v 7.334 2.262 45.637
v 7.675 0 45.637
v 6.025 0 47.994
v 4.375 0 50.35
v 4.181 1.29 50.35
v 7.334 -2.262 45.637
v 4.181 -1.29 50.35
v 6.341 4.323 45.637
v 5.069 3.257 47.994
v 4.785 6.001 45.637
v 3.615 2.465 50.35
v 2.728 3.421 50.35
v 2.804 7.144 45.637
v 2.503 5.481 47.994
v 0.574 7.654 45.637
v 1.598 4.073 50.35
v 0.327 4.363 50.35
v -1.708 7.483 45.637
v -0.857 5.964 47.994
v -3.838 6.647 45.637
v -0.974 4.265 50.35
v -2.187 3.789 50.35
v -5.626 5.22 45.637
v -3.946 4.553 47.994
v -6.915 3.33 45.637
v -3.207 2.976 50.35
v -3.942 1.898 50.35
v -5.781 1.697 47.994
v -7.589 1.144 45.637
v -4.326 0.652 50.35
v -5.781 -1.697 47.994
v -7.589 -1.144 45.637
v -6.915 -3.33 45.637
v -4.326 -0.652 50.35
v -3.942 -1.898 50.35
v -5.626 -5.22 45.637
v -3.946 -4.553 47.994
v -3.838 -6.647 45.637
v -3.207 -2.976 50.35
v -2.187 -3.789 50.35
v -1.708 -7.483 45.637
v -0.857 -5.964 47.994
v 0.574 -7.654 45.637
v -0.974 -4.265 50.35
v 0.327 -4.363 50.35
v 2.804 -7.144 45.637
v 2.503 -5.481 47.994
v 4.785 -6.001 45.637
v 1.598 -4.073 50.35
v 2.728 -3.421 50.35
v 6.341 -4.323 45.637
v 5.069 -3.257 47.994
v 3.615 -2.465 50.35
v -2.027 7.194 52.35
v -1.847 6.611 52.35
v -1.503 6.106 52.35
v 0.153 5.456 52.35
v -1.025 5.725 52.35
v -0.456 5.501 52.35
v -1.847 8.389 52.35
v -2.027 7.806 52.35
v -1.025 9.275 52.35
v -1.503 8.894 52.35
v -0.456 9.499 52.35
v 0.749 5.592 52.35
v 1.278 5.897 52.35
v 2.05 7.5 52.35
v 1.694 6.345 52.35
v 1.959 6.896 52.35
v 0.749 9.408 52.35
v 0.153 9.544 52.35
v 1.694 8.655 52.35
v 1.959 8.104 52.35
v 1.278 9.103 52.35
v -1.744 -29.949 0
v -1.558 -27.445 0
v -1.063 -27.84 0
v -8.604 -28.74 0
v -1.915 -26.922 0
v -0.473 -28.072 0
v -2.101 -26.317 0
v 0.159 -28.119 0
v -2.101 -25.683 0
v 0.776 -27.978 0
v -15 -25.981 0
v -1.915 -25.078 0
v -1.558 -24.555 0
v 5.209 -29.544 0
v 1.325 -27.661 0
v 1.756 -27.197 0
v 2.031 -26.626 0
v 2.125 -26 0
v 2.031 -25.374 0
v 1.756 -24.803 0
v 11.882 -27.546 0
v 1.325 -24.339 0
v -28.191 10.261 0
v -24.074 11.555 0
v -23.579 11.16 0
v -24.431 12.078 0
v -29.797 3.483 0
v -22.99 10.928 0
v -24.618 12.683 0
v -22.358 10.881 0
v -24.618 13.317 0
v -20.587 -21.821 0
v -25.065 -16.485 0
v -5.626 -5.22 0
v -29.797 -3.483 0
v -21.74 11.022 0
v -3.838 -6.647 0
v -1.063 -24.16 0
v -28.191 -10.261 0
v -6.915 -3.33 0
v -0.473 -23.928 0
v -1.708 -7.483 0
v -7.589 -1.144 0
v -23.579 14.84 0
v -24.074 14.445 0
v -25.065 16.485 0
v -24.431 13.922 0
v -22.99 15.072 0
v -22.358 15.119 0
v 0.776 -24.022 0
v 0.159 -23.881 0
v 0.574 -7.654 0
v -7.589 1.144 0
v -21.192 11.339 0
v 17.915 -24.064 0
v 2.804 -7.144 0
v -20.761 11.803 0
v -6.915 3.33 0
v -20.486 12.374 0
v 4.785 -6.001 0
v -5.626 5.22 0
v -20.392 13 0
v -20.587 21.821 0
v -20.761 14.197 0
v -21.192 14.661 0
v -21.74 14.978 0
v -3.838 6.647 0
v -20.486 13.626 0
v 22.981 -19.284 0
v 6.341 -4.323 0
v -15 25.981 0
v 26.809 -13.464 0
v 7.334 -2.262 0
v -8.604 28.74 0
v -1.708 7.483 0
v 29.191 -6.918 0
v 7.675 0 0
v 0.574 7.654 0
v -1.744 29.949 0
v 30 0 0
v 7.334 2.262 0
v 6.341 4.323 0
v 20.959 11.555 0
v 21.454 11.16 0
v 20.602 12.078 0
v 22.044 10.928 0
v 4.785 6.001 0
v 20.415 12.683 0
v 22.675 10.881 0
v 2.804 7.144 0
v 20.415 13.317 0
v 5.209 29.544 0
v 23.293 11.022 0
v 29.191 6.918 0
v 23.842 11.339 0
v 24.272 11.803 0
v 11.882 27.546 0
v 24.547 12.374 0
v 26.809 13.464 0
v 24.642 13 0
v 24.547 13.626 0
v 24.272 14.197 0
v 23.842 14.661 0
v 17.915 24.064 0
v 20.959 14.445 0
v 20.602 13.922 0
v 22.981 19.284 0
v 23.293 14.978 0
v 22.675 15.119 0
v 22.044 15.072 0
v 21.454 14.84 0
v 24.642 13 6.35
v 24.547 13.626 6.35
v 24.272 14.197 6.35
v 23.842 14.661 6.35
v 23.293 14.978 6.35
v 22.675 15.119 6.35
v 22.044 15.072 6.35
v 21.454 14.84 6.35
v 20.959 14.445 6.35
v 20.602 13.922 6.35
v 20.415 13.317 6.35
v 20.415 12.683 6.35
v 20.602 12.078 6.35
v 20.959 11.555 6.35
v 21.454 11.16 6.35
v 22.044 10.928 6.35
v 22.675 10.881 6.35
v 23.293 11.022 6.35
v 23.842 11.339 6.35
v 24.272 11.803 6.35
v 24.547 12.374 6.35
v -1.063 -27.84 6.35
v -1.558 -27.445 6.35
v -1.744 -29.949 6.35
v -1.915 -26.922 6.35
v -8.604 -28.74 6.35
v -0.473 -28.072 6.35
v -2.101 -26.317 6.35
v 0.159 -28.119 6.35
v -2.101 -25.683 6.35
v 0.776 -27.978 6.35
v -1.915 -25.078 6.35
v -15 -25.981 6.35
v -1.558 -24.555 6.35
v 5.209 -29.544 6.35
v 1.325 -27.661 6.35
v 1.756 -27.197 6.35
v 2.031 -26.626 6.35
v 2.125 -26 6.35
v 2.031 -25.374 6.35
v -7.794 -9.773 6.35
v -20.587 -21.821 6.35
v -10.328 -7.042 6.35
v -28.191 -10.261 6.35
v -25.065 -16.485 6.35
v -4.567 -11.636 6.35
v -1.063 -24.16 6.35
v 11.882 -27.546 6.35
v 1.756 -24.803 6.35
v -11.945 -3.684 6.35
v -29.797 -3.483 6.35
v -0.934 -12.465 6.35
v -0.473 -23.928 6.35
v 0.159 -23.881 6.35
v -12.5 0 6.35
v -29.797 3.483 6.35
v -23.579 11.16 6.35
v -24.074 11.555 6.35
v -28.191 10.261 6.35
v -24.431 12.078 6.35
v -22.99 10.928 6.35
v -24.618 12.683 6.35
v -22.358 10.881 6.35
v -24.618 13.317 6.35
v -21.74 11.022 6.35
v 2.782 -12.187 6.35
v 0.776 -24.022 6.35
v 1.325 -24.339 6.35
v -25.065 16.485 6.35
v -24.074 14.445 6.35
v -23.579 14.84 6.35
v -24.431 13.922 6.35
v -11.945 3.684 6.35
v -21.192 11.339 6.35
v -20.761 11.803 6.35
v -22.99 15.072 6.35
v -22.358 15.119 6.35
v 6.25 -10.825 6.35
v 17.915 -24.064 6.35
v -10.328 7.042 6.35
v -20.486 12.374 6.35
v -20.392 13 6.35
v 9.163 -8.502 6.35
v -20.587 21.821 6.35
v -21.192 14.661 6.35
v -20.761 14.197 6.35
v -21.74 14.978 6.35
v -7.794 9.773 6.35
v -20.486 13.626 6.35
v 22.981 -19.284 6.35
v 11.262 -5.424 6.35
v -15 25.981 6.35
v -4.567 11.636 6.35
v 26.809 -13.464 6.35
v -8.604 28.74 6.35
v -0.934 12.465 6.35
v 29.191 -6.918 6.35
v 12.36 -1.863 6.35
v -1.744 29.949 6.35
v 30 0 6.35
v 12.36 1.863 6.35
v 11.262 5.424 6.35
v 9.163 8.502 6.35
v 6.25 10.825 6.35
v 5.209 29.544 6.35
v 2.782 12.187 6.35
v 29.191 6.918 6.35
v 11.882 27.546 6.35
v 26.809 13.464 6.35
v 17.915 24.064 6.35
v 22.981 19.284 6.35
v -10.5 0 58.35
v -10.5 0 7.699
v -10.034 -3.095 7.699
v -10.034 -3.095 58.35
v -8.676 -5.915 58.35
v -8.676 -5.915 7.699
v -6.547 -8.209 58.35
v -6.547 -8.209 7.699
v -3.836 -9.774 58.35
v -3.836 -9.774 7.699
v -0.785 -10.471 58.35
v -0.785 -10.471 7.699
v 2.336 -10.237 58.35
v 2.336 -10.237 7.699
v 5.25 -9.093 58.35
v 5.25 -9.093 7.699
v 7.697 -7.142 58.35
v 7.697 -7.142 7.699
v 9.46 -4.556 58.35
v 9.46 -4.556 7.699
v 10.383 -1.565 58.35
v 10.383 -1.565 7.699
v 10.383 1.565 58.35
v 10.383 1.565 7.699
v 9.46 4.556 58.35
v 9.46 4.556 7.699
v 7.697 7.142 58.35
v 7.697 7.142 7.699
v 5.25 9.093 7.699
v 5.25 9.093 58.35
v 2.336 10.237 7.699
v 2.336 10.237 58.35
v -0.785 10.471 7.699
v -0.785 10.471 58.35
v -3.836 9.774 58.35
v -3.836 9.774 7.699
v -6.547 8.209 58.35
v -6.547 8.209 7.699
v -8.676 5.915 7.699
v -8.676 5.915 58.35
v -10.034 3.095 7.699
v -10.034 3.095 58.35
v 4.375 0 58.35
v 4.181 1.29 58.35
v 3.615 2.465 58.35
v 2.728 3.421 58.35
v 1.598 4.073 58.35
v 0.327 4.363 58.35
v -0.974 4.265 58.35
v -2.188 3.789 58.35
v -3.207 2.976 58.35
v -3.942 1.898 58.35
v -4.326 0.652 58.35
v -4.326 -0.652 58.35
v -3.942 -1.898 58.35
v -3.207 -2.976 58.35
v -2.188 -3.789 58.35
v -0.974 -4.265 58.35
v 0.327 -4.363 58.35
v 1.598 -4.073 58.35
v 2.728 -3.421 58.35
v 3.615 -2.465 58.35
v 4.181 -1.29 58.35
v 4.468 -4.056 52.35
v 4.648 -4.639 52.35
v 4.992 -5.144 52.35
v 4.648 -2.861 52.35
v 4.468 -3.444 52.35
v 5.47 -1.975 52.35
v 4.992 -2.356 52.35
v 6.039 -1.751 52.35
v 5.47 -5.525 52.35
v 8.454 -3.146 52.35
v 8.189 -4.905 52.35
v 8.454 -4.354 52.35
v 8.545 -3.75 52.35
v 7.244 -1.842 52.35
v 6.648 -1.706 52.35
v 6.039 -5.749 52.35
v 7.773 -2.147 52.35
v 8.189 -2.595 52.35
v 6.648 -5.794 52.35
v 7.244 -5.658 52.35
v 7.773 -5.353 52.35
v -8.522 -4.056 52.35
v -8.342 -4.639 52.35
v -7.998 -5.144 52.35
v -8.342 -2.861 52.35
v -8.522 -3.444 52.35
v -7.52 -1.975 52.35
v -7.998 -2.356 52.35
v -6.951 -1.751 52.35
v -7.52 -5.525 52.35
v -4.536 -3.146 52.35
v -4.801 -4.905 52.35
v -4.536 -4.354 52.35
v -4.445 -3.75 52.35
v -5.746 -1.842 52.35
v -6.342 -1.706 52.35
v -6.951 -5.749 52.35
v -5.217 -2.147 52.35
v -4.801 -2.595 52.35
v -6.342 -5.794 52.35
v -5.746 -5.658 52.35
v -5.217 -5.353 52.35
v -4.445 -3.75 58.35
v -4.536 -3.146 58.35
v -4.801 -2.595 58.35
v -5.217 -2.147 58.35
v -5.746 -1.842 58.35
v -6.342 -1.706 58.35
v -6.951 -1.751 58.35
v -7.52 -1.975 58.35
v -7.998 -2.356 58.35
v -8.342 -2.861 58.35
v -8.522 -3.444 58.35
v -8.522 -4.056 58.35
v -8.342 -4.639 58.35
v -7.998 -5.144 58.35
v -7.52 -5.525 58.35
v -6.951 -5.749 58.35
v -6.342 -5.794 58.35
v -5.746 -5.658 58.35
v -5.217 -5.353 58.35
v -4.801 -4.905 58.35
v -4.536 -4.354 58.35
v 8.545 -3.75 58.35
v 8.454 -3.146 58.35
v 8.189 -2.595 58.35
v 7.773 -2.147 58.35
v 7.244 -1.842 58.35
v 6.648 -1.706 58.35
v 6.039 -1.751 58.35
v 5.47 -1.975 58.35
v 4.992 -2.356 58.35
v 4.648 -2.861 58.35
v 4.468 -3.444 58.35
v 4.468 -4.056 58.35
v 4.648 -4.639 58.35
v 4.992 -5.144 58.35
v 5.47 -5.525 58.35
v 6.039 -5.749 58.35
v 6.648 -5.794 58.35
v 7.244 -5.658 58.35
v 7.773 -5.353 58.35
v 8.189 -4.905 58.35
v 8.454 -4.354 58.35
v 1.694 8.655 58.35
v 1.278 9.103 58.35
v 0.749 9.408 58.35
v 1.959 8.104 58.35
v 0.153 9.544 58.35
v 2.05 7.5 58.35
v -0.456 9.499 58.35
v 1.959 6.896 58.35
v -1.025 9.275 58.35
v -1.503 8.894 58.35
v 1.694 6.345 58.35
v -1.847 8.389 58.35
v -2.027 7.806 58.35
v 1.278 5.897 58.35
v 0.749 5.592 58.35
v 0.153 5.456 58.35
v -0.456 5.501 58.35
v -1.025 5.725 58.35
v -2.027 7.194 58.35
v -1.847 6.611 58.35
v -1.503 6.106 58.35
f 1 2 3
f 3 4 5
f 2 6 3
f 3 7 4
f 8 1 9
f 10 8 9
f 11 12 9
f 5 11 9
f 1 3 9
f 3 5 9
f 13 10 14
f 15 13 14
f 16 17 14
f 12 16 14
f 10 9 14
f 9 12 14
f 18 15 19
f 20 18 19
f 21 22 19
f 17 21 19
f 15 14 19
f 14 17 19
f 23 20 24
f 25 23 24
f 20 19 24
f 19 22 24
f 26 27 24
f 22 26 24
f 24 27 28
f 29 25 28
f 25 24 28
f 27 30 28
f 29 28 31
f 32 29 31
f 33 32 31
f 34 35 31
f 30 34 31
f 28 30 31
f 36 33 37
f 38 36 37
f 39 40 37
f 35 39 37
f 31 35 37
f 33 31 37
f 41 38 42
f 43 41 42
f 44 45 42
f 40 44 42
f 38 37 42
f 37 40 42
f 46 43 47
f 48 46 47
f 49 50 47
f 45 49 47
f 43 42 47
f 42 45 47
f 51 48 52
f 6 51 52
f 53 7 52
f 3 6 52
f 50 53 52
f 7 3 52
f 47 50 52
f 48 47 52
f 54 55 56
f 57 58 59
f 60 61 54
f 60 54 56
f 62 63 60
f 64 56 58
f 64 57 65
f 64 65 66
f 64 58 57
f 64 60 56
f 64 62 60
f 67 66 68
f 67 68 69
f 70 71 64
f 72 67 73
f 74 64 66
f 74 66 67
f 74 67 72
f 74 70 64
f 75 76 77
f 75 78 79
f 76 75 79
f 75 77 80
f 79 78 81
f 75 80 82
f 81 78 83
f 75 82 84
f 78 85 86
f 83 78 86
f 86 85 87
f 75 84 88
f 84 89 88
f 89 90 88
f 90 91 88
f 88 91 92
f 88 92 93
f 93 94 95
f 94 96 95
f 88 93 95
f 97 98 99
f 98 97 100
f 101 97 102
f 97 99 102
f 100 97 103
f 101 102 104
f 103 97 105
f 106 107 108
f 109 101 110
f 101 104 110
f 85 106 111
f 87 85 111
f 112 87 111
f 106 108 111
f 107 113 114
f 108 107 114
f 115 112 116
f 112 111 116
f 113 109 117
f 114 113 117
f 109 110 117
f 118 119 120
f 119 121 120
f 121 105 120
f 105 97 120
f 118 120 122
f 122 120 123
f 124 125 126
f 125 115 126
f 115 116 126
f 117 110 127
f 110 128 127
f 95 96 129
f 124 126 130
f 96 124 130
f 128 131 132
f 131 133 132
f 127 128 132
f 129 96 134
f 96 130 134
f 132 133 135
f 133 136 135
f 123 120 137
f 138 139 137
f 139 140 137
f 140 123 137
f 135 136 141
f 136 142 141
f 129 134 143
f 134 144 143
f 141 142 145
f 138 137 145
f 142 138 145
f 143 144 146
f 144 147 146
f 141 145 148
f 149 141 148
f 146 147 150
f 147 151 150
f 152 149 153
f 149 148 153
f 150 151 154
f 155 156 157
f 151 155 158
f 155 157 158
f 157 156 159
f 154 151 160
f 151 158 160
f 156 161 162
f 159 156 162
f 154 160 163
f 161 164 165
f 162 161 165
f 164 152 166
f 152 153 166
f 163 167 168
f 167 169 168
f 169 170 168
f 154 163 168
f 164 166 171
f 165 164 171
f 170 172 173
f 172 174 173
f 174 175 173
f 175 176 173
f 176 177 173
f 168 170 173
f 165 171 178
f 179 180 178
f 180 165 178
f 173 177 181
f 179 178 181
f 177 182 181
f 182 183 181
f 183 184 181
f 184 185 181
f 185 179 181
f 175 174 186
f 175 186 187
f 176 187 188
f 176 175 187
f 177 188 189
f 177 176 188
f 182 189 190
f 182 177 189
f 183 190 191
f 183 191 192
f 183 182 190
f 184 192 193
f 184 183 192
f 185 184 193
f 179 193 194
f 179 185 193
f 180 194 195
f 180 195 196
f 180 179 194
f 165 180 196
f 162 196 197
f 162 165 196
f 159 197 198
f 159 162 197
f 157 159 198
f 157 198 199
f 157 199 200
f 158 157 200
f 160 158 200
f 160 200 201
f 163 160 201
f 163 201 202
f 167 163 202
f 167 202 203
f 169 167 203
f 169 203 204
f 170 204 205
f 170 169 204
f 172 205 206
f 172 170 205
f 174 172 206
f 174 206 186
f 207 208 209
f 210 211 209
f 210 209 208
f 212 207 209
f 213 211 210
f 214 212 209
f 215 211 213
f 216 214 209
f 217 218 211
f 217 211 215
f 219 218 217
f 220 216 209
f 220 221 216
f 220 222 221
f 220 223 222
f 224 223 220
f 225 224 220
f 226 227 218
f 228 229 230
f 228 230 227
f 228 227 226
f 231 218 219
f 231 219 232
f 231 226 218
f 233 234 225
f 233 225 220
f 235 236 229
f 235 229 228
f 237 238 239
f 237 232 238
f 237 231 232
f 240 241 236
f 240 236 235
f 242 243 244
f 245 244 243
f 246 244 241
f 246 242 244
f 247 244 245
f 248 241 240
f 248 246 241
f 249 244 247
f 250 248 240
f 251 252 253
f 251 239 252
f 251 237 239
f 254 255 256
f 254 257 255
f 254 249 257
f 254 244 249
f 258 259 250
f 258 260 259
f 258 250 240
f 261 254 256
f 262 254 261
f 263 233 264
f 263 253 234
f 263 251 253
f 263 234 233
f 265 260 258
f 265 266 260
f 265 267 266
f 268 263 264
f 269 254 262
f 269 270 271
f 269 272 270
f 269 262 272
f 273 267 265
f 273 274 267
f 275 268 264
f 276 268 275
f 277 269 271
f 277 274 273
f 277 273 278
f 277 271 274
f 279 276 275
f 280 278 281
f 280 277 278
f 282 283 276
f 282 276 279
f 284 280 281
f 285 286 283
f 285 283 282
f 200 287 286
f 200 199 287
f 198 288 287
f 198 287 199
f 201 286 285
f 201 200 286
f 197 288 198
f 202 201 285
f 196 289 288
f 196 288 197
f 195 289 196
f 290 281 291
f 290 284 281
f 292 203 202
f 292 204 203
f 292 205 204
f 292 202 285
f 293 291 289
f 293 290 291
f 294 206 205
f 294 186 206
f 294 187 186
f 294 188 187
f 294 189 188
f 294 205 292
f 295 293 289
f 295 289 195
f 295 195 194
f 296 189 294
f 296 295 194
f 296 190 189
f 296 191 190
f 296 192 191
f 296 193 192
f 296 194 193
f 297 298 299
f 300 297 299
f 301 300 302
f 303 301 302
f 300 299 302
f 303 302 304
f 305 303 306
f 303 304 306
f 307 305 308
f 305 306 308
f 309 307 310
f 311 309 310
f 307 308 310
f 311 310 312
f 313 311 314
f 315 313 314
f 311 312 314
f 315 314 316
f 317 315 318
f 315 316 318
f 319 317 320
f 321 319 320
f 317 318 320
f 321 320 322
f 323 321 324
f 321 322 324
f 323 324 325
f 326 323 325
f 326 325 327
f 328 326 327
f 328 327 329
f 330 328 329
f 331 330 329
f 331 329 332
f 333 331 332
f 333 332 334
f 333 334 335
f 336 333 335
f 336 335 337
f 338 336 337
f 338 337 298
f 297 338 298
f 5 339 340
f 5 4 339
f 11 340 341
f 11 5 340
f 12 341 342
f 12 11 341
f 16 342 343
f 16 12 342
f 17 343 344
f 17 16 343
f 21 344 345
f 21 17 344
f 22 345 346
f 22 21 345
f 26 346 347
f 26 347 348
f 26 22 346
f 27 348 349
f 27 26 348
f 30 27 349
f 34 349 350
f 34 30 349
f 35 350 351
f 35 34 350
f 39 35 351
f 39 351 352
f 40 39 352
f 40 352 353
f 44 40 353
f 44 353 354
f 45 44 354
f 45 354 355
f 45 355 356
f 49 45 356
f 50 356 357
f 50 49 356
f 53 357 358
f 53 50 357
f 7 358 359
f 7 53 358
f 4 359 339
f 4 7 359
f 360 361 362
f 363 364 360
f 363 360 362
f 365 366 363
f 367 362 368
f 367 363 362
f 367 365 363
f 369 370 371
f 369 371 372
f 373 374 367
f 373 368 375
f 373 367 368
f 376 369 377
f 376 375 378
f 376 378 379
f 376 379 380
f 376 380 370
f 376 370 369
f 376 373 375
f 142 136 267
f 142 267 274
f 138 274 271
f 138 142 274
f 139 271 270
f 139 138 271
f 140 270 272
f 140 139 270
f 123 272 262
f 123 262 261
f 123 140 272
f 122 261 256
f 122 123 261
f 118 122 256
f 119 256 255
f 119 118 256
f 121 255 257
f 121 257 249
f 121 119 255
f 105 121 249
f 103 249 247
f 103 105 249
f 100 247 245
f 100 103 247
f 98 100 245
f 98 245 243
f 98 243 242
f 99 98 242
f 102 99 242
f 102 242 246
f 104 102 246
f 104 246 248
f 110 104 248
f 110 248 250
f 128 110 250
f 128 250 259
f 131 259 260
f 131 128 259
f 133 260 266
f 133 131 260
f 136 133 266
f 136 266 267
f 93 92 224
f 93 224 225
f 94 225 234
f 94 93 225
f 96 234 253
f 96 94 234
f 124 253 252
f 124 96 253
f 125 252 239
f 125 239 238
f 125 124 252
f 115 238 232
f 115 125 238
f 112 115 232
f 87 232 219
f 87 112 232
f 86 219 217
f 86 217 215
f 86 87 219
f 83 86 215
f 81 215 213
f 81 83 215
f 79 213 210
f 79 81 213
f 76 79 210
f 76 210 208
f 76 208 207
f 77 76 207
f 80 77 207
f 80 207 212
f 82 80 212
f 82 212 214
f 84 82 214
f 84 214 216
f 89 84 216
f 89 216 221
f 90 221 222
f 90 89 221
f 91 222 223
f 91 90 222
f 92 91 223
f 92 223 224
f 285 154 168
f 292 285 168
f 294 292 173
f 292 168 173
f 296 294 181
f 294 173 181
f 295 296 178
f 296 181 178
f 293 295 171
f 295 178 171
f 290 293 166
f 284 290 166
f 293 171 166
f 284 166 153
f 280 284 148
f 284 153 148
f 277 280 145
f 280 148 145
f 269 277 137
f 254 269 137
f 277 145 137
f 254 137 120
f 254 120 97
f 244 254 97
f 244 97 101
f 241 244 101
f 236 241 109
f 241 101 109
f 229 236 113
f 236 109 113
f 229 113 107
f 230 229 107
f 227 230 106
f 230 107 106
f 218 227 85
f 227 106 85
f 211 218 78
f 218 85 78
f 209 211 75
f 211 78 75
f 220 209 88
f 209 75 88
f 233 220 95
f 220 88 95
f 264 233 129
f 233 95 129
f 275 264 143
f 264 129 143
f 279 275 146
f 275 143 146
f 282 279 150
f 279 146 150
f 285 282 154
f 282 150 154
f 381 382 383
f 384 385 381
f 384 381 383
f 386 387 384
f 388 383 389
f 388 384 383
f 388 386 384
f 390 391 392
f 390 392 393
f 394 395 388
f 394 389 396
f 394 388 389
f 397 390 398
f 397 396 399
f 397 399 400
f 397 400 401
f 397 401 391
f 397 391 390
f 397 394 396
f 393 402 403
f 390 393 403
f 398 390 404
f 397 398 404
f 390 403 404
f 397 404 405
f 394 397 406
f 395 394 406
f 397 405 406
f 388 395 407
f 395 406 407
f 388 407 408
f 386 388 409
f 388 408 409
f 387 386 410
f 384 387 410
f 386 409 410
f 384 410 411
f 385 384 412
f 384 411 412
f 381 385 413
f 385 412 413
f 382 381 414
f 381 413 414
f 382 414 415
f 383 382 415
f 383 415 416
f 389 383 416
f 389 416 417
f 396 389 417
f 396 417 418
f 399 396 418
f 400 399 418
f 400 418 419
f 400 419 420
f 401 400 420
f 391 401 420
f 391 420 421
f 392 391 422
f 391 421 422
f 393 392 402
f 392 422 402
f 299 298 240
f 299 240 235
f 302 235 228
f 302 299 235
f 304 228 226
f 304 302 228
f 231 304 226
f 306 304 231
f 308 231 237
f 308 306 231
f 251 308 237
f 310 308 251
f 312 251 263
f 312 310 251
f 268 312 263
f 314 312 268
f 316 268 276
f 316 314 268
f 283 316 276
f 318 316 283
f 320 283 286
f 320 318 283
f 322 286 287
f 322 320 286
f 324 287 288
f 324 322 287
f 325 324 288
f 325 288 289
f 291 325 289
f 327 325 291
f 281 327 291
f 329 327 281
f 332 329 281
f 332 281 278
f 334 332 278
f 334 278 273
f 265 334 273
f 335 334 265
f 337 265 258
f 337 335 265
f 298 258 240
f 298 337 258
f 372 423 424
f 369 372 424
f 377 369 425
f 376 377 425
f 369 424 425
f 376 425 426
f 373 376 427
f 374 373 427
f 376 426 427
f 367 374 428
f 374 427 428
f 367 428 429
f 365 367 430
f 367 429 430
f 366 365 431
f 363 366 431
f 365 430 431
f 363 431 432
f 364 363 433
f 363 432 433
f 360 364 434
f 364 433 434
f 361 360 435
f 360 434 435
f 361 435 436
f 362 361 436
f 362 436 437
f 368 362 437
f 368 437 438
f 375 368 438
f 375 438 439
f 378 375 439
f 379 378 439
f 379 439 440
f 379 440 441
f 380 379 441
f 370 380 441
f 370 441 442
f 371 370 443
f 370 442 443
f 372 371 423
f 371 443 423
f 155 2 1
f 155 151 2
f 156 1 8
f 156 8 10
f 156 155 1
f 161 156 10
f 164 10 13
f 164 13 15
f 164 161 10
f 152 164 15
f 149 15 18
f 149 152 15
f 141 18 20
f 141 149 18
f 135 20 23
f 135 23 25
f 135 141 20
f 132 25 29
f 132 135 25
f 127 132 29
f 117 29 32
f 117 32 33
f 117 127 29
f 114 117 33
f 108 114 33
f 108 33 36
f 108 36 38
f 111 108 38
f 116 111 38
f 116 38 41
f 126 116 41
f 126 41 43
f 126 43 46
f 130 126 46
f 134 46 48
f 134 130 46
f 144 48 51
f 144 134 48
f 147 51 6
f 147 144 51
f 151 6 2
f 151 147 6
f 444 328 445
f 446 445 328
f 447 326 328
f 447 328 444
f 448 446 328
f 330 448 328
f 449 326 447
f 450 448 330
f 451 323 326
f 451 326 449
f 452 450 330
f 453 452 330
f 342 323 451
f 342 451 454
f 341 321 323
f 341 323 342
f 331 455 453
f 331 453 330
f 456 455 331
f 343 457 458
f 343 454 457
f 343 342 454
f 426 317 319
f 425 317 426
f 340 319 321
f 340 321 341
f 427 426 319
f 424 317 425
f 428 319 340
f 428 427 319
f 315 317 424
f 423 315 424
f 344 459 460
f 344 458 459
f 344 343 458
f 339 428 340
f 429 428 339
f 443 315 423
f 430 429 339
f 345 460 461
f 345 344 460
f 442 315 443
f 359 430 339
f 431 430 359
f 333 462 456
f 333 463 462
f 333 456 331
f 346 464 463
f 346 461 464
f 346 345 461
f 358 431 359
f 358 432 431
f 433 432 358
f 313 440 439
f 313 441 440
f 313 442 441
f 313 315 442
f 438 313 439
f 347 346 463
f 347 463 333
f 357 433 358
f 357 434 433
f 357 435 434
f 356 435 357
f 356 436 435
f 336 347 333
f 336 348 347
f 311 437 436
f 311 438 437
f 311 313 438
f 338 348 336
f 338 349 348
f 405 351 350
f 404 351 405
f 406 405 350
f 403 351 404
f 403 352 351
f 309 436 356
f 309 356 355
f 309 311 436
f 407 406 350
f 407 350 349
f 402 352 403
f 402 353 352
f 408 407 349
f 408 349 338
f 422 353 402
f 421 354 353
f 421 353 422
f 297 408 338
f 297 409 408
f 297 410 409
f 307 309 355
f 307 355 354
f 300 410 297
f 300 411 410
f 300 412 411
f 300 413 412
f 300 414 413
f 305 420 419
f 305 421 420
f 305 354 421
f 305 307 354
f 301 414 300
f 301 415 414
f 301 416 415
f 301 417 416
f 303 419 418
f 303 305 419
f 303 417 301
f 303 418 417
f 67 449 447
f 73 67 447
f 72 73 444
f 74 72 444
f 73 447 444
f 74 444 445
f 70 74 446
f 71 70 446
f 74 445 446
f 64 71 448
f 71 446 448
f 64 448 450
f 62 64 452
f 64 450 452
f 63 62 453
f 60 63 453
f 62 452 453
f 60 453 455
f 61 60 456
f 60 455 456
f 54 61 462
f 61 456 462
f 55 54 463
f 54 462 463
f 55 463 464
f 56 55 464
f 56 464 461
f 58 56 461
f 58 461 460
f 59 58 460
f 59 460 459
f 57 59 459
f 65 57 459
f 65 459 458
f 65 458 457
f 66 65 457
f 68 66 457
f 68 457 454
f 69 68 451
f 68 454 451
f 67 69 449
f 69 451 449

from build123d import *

# Parameters (mm, degrees)
ESQUISSE3_R         = 30
ESQUISSE3_R_2       = 2.125
ESQUISSE3_R_3       = 7.675
BOSS_EXTRU_1_DEPTH  = 6.35
ESQUISSE4_R         = 10.5
ESQUISSE4_R_2       = 7.675
BOSS_EXTRU_2_DEPTH  = 45
SKETCH1_R           = 10.5
SKETCH1_R_2         = 4.375
BOSS_EXTRUDE1_DEPTH = 7
SKETCH2_R           = 2.05
CUT_EXTRUDE1_DEPTH  = 6
CHAMFER2_SIZE       = 5.712592027
CHAMFER2_SIZE_2     = 4
CHAMFER3_SIZE       = 2
CHAMFER3_SIZE2      = 1.349017034


with BuildPart() as part:
    # Esquisse3 → Boss.-Extru.1 (new body)
    with BuildSketch(Plane.XY):
        Circle(ESQUISSE3_R)
        with Locations((-22.516660498, 13)):
            Circle(ESQUISSE3_R_2, mode=Mode.SUBTRACT)
        with Locations((22.516660498, 13)):
            Circle(ESQUISSE3_R_2, mode=Mode.SUBTRACT)
        with Locations((0, -26)):
            Circle(ESQUISSE3_R_2, mode=Mode.SUBTRACT)
        Circle(ESQUISSE3_R_3, mode=Mode.SUBTRACT)
    extrude(amount=BOSS_EXTRU_1_DEPTH)

    # Esquisse4 → Boss.-Extru.2 (add)
    with BuildSketch(Plane.XY.offset(6.35)):
        with Locations(Location((0, 0, 0), (0, 0, 180))):
            Circle(ESQUISSE4_R)
        Circle(ESQUISSE4_R_2, mode=Mode.SUBTRACT)
    extrude(amount=BOSS_EXTRU_2_DEPTH)

    # Sketch1 → Boss-Extrude1 (add)
    with BuildSketch(Plane.XY.offset(51.35)):
        with Locations(Location((0, 0, 0), (0, 0, 180))):
            Circle(SKETCH1_R)
        Circle(SKETCH1_R_2, mode=Mode.SUBTRACT)
    extrude(amount=BOSS_EXTRUDE1_DEPTH)

    # Sketch2 → Cut-Extrude1 (cut)
    with BuildSketch(Plane.XY.offset(58.35)):
        with Locations((0, 7.5)):
            Circle(SKETCH2_R)
        with Locations((-6.495190528, -3.75)):
            Circle(SKETCH2_R)
        with Locations((6.495190528, -3.75)):
            Circle(SKETCH2_R)
    extrude(amount=-CUT_EXTRUDE1_DEPTH, mode=Mode.SUBTRACT)

    # Chamfer2
    # the kernel refuses this chamfer: 5.712592027, 4 mm, written as the material it adds along each edge
    with BuildSketch(Plane(origin=(0, 0, 51.35), x_dir=(1, 0, 0), z_dir=(0, -1, 0))) as chamfer2_piece_1_section:
        Polygon((7.675, -CHAMFER2_SIZE), (7.675 - CHAMFER2_SIZE_2, 0), (7.675, 0), align=None)
    chamfer2_piece_1 = revolve(axis=Axis((0, 0, 51.35), (0, 0, 1)), mode=Mode.PRIVATE)
    chamfer2_piece_1 = chamfer2_piece_1 - Plane(origin=(0, 0, 47.945767055), x_dir=(1, 0, 0), z_dir=(0, 0, -1)) * Cylinder(4.375, 31, mode=Mode.PRIVATE)
    add(chamfer2_piece_1)

    # Chamfer3
    chamfer3_edges = [part.edges().sort_by_distance(p)[0] for p in [
        (10.5, 0, 6.35),
    ]]
    chamfer3_side = [part.faces().sort_by_distance(p)[0] for p in [
        (-29.151471863, 0, 6.35),
    ]]
    chamfer(chamfer3_edges, length=CHAMFER3_SIZE, length2=CHAMFER3_SIZE2, reference=chamfer3_side[0])


solid = part.part
